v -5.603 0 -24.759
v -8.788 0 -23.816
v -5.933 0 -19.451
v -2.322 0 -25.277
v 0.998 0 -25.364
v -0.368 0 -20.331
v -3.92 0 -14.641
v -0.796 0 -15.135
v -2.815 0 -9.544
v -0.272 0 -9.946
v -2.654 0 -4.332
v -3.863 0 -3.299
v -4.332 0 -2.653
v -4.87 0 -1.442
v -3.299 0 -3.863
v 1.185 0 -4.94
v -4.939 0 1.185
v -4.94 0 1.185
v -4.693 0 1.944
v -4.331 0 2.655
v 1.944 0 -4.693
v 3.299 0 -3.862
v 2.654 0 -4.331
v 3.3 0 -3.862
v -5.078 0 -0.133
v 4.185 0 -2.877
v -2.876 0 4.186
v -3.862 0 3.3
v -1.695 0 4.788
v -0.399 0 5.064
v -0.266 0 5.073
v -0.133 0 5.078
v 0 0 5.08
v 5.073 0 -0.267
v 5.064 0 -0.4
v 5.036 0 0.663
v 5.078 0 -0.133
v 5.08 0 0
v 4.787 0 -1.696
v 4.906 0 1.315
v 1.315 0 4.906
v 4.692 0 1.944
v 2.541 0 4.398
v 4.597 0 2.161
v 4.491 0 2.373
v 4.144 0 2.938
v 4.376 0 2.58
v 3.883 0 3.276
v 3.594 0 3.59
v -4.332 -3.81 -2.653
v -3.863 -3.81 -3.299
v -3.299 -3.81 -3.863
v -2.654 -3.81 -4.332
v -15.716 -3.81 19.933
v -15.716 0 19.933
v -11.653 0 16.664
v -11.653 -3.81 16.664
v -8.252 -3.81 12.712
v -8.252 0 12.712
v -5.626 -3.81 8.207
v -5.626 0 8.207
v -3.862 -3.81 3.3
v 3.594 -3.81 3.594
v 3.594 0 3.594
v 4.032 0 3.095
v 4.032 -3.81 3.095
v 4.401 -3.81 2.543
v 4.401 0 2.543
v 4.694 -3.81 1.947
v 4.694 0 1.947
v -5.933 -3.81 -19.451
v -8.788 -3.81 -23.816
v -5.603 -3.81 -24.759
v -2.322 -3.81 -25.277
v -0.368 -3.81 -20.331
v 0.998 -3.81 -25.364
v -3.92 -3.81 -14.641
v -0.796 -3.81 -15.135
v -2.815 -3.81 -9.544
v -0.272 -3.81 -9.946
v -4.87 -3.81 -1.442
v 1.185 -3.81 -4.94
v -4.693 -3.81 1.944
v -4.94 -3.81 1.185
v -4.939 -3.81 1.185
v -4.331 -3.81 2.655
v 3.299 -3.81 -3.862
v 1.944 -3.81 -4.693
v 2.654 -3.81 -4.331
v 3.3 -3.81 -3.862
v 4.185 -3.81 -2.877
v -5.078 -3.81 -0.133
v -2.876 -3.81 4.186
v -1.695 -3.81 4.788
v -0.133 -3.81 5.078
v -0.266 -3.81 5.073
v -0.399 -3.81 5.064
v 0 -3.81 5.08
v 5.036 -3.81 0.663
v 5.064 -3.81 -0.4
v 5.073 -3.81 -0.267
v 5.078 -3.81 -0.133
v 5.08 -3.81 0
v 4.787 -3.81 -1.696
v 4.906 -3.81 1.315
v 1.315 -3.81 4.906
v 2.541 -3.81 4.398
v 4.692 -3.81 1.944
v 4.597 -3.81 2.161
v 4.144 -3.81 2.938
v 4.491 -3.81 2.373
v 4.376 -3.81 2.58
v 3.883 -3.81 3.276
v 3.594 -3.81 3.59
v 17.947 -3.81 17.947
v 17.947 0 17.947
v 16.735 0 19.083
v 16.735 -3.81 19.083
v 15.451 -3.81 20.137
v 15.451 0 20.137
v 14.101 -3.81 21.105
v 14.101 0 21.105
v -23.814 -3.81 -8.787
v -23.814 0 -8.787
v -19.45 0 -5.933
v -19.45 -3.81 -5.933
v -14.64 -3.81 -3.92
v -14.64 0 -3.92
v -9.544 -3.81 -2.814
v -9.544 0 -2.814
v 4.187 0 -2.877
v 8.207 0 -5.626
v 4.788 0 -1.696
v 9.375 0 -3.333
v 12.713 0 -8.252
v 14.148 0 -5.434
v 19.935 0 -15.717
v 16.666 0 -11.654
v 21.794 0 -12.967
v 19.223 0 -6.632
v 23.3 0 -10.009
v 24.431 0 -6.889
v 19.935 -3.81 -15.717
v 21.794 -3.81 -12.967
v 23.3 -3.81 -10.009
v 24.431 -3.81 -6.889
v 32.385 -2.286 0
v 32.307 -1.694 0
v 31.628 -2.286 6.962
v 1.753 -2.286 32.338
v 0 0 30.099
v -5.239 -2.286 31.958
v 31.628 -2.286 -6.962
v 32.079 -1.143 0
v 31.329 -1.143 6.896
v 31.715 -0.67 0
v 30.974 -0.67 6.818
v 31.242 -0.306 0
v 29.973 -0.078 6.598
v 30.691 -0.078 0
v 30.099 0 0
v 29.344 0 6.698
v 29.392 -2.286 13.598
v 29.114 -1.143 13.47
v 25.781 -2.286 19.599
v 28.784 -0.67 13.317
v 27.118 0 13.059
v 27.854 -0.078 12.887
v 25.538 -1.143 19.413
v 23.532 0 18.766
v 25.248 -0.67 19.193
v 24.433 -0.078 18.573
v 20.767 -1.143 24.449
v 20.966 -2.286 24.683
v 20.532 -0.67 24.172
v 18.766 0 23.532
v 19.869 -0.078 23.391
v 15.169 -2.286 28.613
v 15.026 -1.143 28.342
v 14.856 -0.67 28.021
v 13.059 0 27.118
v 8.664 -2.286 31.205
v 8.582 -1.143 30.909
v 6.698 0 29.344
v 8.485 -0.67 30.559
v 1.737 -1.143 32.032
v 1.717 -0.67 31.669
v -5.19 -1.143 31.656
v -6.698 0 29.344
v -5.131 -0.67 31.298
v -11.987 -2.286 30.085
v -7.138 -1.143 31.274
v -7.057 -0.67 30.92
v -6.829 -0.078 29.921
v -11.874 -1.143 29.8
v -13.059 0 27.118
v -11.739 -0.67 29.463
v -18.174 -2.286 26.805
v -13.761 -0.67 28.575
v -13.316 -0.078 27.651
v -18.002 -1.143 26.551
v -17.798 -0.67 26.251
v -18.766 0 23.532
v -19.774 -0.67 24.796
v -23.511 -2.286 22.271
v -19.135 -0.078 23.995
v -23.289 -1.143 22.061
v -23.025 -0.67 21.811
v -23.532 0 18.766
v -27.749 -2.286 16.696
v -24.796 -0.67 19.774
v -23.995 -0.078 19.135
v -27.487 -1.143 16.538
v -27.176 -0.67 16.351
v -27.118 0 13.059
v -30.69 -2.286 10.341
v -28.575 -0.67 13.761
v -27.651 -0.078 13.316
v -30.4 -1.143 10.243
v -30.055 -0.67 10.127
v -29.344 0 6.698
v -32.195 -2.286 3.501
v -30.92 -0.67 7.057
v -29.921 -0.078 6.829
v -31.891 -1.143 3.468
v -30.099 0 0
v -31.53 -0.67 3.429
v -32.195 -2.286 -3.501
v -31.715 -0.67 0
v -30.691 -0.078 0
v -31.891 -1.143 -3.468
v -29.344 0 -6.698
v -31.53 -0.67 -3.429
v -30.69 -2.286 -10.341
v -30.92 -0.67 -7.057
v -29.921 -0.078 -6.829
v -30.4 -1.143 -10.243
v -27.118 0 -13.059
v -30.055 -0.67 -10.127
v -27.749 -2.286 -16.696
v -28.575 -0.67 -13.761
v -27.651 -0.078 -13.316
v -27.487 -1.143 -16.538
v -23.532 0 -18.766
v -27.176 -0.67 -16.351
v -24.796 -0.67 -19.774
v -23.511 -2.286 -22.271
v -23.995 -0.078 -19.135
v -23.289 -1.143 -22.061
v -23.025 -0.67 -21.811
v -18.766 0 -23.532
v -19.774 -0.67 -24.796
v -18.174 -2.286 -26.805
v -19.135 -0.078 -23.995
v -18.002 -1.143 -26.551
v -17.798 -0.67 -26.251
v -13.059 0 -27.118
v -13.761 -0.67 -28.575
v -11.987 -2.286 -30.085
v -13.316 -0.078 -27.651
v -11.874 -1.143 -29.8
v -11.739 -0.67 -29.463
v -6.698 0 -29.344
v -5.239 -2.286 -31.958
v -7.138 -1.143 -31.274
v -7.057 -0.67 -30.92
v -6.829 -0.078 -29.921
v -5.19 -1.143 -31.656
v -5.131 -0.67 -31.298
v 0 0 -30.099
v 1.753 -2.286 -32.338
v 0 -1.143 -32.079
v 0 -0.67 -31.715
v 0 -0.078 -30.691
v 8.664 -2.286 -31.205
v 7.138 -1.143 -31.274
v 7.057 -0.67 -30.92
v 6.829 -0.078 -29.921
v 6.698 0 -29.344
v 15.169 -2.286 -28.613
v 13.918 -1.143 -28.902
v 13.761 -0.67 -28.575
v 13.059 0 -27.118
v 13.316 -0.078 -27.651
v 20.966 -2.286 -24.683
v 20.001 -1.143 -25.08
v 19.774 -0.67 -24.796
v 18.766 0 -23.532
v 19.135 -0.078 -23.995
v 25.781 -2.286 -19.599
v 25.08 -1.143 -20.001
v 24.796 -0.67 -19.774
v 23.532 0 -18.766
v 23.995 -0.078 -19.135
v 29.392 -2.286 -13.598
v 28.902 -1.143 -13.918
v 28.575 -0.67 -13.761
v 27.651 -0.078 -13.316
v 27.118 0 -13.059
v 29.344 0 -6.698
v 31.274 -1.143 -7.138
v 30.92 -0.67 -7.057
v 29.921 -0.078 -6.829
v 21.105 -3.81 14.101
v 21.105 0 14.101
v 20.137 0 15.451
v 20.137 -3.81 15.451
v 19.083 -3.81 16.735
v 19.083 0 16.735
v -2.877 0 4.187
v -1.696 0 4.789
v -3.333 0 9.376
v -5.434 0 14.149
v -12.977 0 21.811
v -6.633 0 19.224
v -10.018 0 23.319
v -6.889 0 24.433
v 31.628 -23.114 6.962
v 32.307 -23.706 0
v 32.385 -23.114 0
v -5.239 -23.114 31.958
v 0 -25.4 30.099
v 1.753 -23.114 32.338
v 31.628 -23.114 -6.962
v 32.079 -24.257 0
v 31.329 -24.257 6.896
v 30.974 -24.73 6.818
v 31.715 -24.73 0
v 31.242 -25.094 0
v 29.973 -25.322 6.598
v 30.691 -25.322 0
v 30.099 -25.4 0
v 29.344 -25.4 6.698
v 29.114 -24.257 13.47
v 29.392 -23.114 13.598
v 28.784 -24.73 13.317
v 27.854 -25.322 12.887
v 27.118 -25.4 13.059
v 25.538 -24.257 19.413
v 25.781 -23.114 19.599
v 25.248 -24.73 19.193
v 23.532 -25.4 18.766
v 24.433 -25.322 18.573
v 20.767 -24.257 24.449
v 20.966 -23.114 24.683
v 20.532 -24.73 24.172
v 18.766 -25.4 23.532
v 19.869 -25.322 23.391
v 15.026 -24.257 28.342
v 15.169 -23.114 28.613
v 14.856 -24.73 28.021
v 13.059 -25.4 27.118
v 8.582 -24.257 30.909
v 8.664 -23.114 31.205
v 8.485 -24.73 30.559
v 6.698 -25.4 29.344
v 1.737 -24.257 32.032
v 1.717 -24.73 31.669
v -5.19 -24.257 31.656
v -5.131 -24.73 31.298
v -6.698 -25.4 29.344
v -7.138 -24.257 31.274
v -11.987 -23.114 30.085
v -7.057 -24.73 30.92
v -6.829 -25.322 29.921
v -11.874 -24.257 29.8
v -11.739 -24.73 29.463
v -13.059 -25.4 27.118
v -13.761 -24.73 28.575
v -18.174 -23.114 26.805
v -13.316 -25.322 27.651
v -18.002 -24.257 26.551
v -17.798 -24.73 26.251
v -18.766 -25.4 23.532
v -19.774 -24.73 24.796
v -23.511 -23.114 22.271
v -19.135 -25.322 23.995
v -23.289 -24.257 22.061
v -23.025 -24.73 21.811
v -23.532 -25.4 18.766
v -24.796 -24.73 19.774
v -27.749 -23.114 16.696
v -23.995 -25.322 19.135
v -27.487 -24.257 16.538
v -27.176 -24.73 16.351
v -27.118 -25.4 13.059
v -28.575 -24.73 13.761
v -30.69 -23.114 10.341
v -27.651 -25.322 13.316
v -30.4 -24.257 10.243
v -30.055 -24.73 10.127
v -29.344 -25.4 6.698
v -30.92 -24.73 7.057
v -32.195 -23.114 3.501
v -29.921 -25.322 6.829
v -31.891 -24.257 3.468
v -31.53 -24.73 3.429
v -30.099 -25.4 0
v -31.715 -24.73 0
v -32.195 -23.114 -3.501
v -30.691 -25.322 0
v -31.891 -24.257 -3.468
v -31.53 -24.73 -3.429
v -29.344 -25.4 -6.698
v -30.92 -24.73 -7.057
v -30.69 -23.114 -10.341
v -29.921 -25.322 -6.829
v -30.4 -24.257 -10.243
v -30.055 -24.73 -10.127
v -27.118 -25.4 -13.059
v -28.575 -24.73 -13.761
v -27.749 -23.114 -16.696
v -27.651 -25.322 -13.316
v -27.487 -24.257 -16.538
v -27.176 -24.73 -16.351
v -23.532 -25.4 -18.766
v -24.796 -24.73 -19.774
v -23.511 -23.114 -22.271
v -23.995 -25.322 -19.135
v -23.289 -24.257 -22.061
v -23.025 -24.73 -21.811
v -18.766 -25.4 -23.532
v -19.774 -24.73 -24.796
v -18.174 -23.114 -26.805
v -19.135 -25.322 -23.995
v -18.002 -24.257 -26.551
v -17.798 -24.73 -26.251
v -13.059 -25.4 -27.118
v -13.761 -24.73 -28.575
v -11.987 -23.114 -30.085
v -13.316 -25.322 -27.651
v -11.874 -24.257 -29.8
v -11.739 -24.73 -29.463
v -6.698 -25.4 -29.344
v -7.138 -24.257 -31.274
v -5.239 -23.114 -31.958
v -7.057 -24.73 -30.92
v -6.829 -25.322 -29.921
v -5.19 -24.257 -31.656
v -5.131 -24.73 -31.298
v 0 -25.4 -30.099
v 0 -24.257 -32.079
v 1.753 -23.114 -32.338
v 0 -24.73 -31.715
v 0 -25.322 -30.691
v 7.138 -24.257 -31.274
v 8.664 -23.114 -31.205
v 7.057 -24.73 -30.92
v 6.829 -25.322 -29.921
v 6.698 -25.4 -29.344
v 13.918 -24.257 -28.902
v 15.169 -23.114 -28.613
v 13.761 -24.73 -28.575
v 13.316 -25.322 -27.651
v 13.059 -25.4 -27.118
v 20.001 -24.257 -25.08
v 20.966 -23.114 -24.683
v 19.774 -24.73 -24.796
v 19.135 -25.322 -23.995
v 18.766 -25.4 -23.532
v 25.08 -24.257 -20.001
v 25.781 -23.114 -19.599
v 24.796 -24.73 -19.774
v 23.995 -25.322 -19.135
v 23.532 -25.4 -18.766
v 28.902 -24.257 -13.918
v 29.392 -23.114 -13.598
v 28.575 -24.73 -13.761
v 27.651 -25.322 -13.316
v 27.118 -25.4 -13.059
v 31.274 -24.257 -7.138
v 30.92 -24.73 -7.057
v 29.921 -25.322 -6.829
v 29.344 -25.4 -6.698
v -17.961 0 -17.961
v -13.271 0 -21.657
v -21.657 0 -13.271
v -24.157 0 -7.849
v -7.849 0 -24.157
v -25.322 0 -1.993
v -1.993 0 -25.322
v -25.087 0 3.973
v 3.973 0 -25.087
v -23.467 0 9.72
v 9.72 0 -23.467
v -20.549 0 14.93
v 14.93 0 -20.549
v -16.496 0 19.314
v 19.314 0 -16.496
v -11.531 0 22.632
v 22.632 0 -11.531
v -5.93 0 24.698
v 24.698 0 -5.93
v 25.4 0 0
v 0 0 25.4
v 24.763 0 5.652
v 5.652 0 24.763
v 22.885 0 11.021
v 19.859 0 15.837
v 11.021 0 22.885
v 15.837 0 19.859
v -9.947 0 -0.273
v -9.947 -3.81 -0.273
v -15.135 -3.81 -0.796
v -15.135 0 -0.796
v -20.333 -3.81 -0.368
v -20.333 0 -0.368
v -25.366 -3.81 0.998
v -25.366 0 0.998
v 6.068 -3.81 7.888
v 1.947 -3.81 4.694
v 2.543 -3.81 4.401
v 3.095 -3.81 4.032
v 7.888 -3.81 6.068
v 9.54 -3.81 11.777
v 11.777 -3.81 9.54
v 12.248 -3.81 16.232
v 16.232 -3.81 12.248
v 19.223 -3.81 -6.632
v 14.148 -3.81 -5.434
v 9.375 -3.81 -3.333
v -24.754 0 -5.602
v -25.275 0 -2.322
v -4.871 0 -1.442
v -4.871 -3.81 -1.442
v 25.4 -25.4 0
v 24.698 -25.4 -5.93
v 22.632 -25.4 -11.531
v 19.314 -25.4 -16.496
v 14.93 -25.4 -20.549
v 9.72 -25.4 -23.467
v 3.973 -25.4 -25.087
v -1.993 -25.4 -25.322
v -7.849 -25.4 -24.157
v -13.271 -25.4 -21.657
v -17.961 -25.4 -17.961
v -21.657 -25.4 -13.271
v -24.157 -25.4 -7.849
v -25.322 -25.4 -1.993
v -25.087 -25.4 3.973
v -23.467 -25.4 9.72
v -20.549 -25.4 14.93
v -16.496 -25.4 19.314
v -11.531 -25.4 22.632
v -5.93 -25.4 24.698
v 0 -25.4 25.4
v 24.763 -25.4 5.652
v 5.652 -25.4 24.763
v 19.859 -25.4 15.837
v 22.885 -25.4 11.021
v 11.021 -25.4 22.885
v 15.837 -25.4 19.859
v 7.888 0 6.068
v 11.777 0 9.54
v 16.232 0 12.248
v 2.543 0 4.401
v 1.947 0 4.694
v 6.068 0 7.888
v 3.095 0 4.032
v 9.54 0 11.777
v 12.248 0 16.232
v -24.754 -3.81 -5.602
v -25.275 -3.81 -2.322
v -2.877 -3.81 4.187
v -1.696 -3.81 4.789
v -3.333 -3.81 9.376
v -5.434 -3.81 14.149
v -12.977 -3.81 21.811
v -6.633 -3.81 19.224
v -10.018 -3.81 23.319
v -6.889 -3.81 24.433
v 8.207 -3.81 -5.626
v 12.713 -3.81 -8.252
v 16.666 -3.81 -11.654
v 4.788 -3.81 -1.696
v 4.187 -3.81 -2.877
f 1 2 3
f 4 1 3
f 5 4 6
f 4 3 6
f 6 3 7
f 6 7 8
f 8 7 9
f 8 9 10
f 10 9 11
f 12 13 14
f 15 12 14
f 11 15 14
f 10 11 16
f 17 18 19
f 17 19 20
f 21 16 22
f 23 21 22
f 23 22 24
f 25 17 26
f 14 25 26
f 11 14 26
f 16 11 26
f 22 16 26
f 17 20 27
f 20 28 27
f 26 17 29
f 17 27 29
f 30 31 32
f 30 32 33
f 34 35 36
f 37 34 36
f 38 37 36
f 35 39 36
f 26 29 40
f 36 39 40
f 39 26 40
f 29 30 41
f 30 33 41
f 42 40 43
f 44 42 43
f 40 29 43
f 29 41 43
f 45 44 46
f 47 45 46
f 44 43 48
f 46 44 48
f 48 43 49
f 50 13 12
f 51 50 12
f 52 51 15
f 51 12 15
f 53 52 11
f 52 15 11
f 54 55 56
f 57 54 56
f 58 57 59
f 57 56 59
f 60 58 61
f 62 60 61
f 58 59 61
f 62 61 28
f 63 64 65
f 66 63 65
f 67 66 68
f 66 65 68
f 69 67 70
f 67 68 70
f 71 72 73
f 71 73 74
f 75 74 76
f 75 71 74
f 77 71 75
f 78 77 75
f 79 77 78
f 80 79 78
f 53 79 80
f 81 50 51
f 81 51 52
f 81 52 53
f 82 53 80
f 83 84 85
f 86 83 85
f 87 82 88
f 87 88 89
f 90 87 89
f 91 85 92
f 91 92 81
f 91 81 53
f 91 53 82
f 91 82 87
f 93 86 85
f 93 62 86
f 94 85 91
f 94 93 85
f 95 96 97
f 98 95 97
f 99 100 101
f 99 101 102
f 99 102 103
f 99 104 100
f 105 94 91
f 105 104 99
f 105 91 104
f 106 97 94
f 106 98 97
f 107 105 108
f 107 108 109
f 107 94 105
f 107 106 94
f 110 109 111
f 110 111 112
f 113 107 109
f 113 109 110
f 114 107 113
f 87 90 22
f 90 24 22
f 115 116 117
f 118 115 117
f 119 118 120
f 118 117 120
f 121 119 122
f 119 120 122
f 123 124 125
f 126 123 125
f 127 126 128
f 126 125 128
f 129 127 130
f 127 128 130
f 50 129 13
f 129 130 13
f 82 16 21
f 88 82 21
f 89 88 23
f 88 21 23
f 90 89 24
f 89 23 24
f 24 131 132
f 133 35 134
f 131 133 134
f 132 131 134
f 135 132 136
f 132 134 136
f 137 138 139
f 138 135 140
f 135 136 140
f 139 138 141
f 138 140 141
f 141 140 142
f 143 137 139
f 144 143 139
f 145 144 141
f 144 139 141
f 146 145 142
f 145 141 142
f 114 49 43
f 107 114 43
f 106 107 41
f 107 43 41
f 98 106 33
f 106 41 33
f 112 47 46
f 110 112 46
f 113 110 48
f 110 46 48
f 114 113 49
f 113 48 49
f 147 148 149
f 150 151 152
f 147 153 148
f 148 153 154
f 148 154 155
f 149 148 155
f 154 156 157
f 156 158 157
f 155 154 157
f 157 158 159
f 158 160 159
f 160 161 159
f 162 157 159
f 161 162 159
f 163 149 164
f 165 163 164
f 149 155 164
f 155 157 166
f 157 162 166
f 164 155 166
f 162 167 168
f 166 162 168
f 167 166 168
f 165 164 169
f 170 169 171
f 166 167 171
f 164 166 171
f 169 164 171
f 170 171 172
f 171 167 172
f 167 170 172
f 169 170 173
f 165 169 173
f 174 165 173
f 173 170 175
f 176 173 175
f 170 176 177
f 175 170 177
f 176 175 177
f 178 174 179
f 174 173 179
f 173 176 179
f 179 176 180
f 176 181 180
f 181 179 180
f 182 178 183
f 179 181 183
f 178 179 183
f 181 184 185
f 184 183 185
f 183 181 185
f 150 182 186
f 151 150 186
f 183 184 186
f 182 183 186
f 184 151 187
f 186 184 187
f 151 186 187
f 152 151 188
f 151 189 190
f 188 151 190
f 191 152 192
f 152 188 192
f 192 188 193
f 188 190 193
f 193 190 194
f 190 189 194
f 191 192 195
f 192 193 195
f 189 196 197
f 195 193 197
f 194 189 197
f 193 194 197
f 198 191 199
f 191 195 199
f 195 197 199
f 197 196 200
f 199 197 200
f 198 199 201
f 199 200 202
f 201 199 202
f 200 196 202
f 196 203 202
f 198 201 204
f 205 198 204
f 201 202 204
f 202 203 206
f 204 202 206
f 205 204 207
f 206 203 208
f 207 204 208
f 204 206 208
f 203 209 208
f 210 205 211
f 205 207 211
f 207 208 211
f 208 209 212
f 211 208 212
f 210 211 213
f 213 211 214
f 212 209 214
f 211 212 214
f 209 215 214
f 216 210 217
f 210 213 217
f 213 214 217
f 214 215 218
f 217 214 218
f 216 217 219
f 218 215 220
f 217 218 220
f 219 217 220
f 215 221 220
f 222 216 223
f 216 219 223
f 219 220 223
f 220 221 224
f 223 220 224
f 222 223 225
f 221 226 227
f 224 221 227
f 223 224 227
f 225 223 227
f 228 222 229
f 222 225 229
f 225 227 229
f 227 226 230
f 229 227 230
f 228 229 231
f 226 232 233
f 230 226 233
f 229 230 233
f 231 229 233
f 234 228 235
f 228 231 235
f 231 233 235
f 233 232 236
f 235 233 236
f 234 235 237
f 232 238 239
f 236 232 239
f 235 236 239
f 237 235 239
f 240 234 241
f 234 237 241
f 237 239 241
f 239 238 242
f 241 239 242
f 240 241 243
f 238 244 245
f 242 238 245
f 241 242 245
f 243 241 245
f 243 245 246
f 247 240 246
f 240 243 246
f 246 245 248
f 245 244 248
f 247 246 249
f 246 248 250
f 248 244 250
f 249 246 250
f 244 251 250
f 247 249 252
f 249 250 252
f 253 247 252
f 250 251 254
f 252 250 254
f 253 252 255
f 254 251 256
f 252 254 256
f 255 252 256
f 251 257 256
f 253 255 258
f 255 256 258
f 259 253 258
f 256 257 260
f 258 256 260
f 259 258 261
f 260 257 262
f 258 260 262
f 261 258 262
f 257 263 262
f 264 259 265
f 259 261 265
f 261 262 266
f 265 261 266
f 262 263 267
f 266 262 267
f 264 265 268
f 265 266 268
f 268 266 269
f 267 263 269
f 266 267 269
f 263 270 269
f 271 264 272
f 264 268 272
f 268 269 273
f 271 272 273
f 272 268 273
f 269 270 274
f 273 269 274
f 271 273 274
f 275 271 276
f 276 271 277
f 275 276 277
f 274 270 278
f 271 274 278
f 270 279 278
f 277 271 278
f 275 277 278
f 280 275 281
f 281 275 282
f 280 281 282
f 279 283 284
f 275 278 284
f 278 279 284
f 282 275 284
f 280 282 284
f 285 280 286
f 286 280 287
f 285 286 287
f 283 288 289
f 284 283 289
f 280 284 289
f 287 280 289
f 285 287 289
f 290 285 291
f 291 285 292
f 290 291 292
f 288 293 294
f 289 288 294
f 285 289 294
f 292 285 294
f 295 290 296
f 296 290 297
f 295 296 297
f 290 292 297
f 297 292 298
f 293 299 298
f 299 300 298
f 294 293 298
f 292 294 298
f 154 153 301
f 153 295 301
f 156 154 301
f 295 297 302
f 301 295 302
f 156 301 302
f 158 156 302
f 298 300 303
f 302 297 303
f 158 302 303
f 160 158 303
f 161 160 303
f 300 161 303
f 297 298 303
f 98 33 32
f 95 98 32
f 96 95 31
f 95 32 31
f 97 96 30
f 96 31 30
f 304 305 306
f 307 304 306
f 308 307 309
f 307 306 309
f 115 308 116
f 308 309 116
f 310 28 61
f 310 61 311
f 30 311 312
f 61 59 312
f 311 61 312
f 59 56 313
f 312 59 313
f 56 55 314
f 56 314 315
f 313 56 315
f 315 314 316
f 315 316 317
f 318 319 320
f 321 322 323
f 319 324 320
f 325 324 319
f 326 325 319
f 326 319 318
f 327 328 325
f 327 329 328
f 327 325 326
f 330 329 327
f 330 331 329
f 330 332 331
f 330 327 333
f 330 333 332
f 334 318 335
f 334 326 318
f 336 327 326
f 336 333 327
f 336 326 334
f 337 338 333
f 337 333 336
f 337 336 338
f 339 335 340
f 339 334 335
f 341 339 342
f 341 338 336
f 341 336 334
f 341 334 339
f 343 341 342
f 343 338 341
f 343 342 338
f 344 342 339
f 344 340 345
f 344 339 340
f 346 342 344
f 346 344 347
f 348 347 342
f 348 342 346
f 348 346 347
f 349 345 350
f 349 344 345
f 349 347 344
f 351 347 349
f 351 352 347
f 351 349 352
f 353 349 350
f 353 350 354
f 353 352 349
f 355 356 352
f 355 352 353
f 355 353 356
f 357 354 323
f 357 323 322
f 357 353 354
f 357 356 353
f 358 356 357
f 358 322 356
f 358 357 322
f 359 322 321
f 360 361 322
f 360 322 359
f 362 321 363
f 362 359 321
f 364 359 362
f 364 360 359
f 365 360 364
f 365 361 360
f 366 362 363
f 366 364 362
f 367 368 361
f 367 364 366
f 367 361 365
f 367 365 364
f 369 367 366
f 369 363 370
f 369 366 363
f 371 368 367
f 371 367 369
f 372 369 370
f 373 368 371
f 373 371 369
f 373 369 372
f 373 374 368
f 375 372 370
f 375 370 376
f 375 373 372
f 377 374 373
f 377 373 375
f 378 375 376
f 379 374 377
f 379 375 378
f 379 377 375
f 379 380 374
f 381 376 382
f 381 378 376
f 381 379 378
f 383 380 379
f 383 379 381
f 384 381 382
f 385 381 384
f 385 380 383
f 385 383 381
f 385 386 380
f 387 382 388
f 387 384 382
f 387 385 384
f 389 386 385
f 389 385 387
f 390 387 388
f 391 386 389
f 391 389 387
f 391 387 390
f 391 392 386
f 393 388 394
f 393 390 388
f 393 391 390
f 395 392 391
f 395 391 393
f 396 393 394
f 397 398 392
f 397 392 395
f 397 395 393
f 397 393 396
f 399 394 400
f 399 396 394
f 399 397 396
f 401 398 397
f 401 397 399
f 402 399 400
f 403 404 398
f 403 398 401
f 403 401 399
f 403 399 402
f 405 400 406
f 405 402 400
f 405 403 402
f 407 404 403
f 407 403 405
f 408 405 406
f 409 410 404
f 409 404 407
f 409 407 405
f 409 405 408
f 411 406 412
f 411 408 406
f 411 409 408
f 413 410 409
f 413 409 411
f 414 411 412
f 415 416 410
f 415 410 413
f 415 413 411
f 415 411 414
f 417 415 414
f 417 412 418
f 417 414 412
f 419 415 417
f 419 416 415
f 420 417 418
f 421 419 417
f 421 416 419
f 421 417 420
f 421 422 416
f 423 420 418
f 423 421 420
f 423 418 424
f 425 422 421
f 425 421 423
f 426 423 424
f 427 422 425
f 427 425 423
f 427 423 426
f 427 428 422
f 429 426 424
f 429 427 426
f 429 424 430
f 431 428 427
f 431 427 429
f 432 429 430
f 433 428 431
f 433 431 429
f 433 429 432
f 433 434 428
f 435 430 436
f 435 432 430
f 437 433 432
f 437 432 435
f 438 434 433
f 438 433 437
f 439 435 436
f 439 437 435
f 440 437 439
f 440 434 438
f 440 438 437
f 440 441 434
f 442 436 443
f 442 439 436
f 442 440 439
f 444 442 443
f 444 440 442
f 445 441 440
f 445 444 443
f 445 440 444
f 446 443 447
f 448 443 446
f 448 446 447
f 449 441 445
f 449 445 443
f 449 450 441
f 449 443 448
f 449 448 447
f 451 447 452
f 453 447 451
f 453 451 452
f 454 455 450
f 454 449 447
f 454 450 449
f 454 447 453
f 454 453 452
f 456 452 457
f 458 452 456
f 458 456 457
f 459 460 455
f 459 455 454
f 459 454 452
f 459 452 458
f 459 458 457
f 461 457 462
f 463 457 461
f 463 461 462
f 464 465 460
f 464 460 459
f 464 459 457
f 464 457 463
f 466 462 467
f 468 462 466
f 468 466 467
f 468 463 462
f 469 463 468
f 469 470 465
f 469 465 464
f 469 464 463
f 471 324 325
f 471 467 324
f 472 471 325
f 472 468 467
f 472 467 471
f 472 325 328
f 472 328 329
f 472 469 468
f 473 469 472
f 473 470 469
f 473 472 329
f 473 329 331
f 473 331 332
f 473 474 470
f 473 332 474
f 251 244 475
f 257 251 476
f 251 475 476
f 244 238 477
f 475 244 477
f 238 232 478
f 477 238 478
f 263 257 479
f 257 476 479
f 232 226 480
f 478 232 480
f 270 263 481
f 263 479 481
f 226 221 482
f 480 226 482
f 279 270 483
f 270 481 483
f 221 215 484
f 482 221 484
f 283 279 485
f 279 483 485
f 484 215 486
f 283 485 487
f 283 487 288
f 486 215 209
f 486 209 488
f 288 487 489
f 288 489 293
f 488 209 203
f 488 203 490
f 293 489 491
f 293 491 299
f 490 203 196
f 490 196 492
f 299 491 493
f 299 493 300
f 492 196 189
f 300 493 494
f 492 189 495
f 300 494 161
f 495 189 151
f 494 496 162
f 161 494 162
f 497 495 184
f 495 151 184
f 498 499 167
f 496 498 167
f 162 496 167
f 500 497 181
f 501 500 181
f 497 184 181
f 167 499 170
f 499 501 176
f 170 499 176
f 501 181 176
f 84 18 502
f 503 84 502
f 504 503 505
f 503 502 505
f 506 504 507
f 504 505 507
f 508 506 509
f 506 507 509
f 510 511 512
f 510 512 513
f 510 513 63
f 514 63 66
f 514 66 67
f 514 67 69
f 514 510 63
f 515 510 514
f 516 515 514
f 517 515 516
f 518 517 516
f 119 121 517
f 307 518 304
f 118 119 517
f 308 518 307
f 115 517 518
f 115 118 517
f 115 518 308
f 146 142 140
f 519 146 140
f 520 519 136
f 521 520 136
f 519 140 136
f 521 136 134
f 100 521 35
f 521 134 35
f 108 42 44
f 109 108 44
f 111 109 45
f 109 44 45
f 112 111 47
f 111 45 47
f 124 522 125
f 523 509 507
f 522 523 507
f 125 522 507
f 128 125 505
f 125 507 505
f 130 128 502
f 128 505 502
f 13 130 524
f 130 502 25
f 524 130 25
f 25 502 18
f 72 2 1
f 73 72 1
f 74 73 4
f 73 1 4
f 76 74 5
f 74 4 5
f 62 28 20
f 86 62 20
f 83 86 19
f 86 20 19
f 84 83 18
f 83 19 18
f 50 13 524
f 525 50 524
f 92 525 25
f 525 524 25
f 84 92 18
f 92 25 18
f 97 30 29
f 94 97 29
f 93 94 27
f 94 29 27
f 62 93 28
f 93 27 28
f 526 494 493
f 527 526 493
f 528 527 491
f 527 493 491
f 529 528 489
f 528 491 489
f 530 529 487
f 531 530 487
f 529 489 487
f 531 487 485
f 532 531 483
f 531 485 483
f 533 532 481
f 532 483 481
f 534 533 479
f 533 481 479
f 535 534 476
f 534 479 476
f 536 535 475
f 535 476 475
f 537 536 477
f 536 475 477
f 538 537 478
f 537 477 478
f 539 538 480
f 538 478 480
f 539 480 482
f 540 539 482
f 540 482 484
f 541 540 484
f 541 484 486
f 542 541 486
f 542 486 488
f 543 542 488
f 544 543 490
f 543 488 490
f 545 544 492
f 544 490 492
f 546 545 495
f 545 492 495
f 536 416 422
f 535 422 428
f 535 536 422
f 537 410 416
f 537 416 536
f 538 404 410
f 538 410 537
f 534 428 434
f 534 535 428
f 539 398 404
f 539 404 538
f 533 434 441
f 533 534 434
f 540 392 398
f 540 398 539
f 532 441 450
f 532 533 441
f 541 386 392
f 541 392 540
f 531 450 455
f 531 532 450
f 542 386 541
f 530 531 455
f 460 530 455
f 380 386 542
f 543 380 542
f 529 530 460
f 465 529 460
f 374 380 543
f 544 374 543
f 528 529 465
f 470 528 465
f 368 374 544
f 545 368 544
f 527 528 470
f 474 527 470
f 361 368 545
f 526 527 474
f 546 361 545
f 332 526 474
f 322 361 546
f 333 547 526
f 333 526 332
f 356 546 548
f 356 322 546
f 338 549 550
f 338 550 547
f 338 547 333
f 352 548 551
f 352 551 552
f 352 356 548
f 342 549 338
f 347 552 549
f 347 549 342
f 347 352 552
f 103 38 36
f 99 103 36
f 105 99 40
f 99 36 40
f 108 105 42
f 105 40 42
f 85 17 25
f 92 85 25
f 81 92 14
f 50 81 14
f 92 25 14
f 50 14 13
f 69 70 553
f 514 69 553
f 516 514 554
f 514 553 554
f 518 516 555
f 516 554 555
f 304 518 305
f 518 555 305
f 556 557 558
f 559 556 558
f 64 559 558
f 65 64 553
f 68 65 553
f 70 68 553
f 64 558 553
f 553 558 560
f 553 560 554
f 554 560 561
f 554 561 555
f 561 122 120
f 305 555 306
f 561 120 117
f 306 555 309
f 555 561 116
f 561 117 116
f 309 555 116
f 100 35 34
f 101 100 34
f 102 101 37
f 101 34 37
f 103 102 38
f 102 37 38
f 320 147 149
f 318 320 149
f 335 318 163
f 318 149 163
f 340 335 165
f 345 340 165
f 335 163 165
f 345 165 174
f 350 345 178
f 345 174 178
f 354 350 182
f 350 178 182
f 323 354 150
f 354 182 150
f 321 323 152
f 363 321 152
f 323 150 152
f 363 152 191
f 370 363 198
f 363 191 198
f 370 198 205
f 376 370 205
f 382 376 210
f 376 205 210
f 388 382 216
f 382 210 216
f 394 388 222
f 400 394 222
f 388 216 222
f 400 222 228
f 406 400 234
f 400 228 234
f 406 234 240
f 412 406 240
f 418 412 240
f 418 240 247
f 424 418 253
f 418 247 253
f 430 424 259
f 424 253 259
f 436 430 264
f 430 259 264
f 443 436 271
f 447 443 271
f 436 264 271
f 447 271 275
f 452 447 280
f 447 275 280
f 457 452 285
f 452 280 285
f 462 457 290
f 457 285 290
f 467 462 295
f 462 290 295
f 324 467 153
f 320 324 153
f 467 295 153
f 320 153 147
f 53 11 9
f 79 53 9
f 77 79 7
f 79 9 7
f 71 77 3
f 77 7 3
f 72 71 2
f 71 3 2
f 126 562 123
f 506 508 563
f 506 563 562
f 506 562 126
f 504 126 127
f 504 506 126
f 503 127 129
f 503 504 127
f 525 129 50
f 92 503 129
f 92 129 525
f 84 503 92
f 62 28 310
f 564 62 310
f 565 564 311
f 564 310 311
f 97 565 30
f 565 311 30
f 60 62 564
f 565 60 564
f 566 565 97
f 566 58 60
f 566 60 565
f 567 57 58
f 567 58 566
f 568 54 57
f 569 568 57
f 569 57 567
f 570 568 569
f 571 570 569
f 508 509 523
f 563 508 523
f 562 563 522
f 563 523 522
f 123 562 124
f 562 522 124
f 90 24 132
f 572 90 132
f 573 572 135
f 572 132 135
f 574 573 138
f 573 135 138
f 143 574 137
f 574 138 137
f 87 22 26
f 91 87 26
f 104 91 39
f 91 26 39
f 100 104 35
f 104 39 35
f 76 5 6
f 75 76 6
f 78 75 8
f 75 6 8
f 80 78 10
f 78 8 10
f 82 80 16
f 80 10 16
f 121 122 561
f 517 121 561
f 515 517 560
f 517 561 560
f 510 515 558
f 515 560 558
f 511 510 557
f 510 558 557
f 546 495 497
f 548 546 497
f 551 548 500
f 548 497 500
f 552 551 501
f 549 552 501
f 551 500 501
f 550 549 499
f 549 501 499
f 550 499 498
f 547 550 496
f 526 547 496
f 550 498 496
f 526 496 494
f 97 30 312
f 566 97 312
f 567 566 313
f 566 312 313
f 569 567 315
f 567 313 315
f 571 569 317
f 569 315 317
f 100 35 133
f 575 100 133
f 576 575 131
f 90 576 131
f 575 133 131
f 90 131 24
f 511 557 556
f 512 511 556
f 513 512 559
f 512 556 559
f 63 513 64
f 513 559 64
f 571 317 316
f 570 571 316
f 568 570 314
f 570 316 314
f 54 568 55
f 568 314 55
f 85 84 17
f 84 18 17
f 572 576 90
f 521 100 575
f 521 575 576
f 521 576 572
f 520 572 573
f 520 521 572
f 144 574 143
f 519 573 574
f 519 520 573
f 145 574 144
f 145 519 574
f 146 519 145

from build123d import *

# Parameters (mm, degrees)
F0_R     = 27.305
F1_DEPTH = 25.4
F2_DEPTH = 3.81
F3_DEPTH = 3.81
F0_R_2   = 32.385
F4_DEPTH = 25.4
F5_R     = 2.286


with BuildPart() as f1:
    # F0 (on Front) → F1 (new body)
    with BuildSketch(Plane.XZ):
        Circle(F0_R)
        with BuildLine():
            ThreePointArc((0, 25.4), (17.9605122421, 17.9605122421), (25.4, 0))
            ThreePointArc((25.4, 0), (-17.9605122421, -17.9605122421), (0, 25.4))
        make_face(mode=Mode.SUBTRACT)
    extrude(amount=F1_DEPTH)

    # F0 (on Front) → F4 (join)
    with BuildSketch(Plane.XZ):
        Circle(F0_R_2)
        Circle(F0_R, mode=Mode.SUBTRACT)
    extrude(amount=F4_DEPTH)

    # F5
    f5_edges = [f1.edges().sort_by_distance(p)[0] for p in [
        (-32.385, 0, 0),
        (-32.385, -25.4, 0),
    ]]
    fillet(f5_edges, radius=F5_R)


with BuildPart() as f2:
    # F0 (on Front) → F2 (new body)
    with BuildSketch(Plane.XZ):
        with BuildLine():
            ThreePointArc((4.6943420121, 1.9469076959), (11.7768309148, 9.5402464113), (21.1050706762, 14.1014288083))
            ThreePointArc((21.1050706762, 14.1014288083), (19.6204327638, 16.1017497715), (17.947313904, 17.947313904))
            ThreePointArc((17.947313904, 17.947313904), (16.1014099509, 19.6203250282), (14.1007988537, 21.1048730615))
            ThreePointArc((14.1007988537, 21.1048730615), (9.5399900472, 11.7767988623), (1.9471382686, 4.694246561))
            ThreePointArc((1.9471382686, 4.694246561), (2.8248144406, 4.2253038625), (3.5940705708, 3.5940608637))
            ThreePointArc((3.5940705708, 3.5940608637), (4.225376988, 2.8247049807), (4.6943420121, 1.9469076959))
        make_face()
        with BuildLine():
            ThreePointArc((24.4307833241, -6.8888302352), (14.14792832, -5.4336738514), (5.0642555877, -0.3996419851))
            ThreePointArc((5.0642555877, -0.3996419851), (4.5262563388, -2.3063828671), (3.2998221317, -3.862327313))
            ThreePointArc((3.2998221317, -3.862327313), (12.7127227114, -8.2524534489), (19.9346977885, -15.716968222))
            ThreePointArc((19.9346977885, -15.716968222), (22.5923186543, -11.5114934038), (24.4307833241, -6.8888302352))
        make_face()
        with BuildLine():
            ThreePointArc((-3.8621651693, 3.3000119059), (-2.3061604636, 4.526369659), (-0.3993931489, 5.0642752183))
            ThreePointArc((-0.3993931489, 5.0642752183), (-5.4341382858, 14.1487260117), (-6.8893071571, 24.4326157606))
            ThreePointArc((-6.8893071571, 24.4326157606), (-11.5217587117, 22.6129744405), (-15.7157660774, 19.9332348715))
            ThreePointArc((-15.7157660774, 19.9332348715), (-8.2520810905, 12.7118781046), (-3.8621651693, 3.3000119059))
        make_face()
        with BuildLine():
            ThreePointArc((-1.5809043391, -4.8277468704), (-0.2058216404, -5.0761626418), (1.1848589263, -4.939889442))
            ThreePointArc((1.1848589263, -4.939889442), (-0.2058081178, -5.0758291335), (-1.5809043391, -4.8277468704))
        make_face()
        with BuildLine():
            ThreePointArc((0.9978603482, -25.3638212927), (-0.7957806377, -15.1345769828), (1.1848589263, -4.939889442))
            ThreePointArc((1.1848589263, -4.939889442), (-0.2058216404, -5.0761626418), (-1.5809043391, -4.8277468704))
            ThreePointArc((-1.5809043391, -4.8277468704), (-2.1317168887, -4.6110933064), (-2.653590442, -4.3318421186))
            ThreePointArc((-2.653590442, -4.3318421186), (-3.9201022654, -14.6406661355), (-8.7875646495, -23.8158345128))
            ThreePointArc((-8.7875646495, -23.8158345128), (-3.9710774773, -25.0716777648), (0.9978603482, -25.3638212927))
        make_face()
        with BuildLine():
            ThreePointArc((-4.3319724994, -2.6533775907), (-5.0174761344, -0.794563789), (-4.9398312171, 1.1851016499))
            ThreePointArc((-4.9398312171, 1.1851016499), (-15.1354791508, -0.7959758408), (-25.3657114203, 0.9979730226))
            ThreePointArc((-25.3657114203, 0.9979730226), (-25.067740133, -3.9702254045), (-23.814071713, -8.7868734083))
            ThreePointArc((-23.814071713, -8.7868734083), (-14.6397478017, -3.9200091294), (-4.3319724994, -2.6533775907))
        make_face()
        with BuildLine():
            ThreePointArc((-2.653590442, -4.3318421186), (-2.1317168887, -4.6110933064), (-1.5809043391, -4.8277468704))
            ThreePointArc((-1.5809043391, -4.8277468704), (-2.1318038089, -4.6106814204), (-2.6536484216, -4.3308853596))
            ThreePointArc((-2.6536484216, -4.3308853596), (-2.6536194278, -4.3313637388), (-2.653590442, -4.3318421186))
        make_face()
    extrude(amount=F2_DEPTH)

    # F0 (on Front) → F3 (join)
    with BuildSketch(Plane.XZ):
        with BuildLine():
            ThreePointArc((5.0642555877, -0.3996419851), (5.0760622509, -0.1999759972), (5.07999984, 0))
            ThreePointArc((5.07999984, 0), (4.9814434579, 0.990970805), (4.6924772139, 1.9439844496))
            ThreePointArc((4.6924772139, 1.9439844496), (4.5453190283, 2.2675494992), (4.3760141266, 2.5800966528))
            ThreePointArc((4.3760141266, 2.5800966528), (4.0169149714, 3.1097897818), (3.5940705708, 3.5901330207))
            ThreePointArc((3.5940705708, 3.5901330207), (1.9450231546, 4.692046096), (1.37204e-05, 5.0799998399))
            ThreePointArc((1.37204e-05, 5.0799998399), (-0.1998444343, 5.0760674322), (-0.3993931489, 5.0642752183))
            ThreePointArc((-0.3993931489, 5.0642752183), (-0.3990885143, 5.0639052384), (-0.3987838736, 5.0635352636))
            ThreePointArc((-0.3987838736, 5.0635352636), (-2.3055656836, 4.5256348971), (-3.8621651693, 3.3000119059))
            ThreePointArc((-3.8621651693, 3.3000119059), (-4.5262563388, 2.3063828671), (-4.9398312171, 1.1851016499))
            ThreePointArc((-4.9398312171, 1.1851016499), (-4.9393852081, 1.1852770445), (-4.9389392019, 1.1854524465))
            ThreePointArc((-4.9389392019, 1.1854524465), (-5.0168667916, -0.7942683785), (-4.3319724994, -2.6533775907))
            ThreePointArc((-4.3319724994, -2.6533775907), (-3.5921905844, -3.5920140839), (-2.653590442, -4.3318421186))
            ThreePointArc((-2.653590442, -4.3318421186), (-2.6536194278, -4.3313637388), (-2.6536484216, -4.3308853596))
            ThreePointArc((-2.6536484216, -4.3308853596), (-2.1318038089, -4.6106814204), (-1.5809043391, -4.8277468704))
            ThreePointArc((-1.5809043391, -4.8277468704), (-0.2058081178, -5.0758291335), (1.1848589263, -4.939889442))
            ThreePointArc((1.1848589263, -4.939889442), (2.3061604635, -4.5263696591), (3.2998221317, -3.862327313))
            ThreePointArc((3.2998221317, -3.862327313), (3.2993582084, -3.8622070527), (3.2988942831, -3.8620868001))
            ThreePointArc((3.2988942831, -3.8620868001), (4.5249044889, -2.3059143186), (5.0642555877, -0.3996419851))
        make_face()
    extrude(amount=F3_DEPTH)


solid = Compound([f1.part, f2.part])
